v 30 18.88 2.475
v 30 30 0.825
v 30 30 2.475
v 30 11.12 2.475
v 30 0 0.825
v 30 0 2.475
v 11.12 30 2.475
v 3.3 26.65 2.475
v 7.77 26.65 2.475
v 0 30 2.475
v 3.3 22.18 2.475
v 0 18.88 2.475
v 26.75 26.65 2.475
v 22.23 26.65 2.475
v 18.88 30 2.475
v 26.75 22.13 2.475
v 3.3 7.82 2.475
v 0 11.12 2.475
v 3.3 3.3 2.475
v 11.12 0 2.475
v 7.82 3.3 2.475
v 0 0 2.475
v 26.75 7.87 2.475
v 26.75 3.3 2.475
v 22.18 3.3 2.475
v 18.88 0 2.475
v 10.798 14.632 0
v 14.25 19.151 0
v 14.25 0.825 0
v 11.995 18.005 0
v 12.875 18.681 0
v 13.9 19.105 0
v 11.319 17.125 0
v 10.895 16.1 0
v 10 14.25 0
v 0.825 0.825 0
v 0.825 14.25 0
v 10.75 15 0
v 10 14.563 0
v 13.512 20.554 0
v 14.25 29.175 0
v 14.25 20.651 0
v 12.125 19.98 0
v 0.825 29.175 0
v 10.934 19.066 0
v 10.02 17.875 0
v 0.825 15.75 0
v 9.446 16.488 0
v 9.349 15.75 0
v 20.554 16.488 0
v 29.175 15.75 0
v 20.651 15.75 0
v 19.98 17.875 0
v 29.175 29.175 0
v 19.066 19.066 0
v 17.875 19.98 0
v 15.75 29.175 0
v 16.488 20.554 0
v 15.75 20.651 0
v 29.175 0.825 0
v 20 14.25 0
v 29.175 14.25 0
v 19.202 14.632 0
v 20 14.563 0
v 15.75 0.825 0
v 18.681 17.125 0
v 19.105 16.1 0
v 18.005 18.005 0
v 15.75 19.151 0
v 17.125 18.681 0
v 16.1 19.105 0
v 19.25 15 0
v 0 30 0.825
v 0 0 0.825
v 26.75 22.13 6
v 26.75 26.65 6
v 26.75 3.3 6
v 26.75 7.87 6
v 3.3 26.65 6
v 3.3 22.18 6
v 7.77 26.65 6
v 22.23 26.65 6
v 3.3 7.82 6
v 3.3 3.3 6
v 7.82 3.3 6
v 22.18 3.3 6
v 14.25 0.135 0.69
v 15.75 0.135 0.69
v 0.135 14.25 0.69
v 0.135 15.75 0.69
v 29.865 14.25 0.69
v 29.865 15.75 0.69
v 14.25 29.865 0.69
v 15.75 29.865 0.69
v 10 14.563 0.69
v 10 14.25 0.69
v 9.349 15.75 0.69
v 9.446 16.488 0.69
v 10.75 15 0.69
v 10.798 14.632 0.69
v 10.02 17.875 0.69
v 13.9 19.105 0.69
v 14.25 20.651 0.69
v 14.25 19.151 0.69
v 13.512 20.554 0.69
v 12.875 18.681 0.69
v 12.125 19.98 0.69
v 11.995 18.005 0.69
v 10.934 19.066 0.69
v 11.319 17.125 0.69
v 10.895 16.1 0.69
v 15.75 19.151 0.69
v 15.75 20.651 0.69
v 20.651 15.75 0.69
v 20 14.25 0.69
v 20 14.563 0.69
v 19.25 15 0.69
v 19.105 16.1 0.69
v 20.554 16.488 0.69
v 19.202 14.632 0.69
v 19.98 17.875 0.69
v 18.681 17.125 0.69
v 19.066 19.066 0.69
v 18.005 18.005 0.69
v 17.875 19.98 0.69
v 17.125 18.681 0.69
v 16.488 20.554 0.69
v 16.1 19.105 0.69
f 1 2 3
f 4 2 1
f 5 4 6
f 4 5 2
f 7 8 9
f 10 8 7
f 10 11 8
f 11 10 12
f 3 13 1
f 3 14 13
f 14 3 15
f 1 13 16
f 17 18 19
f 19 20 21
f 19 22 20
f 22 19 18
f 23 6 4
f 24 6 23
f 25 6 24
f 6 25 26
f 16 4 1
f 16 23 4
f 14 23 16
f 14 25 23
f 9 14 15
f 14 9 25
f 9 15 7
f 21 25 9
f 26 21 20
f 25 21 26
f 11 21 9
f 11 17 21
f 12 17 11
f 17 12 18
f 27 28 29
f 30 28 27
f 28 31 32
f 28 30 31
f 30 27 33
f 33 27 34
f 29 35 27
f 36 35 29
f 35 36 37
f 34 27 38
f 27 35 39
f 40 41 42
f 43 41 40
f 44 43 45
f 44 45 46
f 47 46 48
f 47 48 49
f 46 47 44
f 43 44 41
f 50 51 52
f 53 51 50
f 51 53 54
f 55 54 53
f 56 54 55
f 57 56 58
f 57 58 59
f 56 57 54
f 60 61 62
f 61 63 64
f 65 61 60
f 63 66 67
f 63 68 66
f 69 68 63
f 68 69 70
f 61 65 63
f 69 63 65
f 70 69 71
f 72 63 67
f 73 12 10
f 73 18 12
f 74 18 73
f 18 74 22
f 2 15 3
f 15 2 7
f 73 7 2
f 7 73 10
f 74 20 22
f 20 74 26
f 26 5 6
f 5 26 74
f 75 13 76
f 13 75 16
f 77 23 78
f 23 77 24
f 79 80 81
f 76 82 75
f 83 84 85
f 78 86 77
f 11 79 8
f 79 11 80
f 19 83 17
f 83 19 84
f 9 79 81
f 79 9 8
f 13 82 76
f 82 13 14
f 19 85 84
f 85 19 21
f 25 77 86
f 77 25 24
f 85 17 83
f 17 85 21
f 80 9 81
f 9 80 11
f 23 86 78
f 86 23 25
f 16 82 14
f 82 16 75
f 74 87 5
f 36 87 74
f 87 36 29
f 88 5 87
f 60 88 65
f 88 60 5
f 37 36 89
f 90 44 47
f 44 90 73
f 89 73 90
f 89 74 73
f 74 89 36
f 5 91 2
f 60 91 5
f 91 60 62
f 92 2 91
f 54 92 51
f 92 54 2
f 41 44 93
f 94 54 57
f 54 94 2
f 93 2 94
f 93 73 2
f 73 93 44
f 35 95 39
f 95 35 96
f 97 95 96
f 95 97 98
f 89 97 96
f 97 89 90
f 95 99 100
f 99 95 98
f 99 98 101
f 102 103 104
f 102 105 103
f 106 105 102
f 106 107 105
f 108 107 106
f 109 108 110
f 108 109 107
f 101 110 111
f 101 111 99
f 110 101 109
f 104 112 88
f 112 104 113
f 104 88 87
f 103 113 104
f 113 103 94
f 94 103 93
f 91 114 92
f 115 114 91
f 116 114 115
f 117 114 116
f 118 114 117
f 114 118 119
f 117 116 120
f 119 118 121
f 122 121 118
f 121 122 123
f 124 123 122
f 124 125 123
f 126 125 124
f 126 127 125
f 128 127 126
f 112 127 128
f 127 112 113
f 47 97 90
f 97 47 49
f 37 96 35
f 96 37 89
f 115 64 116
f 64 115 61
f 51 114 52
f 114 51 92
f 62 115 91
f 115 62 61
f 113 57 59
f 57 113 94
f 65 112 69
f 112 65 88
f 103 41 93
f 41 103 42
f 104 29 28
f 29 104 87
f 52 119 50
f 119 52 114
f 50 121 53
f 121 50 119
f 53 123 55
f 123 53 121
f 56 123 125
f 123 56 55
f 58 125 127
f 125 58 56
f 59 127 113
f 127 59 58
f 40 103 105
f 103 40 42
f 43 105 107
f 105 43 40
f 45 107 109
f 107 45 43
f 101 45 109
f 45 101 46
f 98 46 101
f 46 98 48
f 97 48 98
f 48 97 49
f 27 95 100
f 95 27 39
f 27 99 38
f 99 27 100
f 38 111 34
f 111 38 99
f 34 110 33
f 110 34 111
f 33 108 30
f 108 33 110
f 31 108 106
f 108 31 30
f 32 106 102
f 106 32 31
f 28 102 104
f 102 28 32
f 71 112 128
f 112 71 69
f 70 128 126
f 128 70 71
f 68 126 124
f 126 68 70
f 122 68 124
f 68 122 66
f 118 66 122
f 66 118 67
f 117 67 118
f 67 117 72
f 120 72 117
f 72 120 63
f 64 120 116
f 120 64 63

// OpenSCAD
// file: settings.scad
cube_width=30;
cube_height=16;
cube_thickness=3.3;

cap_width=30;
cap_height=6;
cap_thickness=3.3;

glyph_depth=0.7;
glyph_thickness=1.5;

photo_resitor_hole_r = 2.4;
spring_contact_hole_r = 3.125;
// file: sym_inductor.scad
module sector(radius, angles, fn = 24) {
    r = radius / cos(180 / fn);
    step = -360 / fn;

    points = concat([[0, 0]],
        [for(a = [angles[0] : step : angles[1] - 360]) 
            [r * cos(a), r * sin(a)]
        ],
        [[r * cos(angles[1]), r * sin(angles[1])]]
    );

    difference() {
        circle(radius, $fn = fn);
        polygon(points);
    }
}

module arc(radius, angles, width, fn = 24) {
    difference() {
        sector(radius + width/2, angles, fn);
        sector(radius - width/2, angles, fn);
    }
} 

module arc_3d(radius, angles, width, depth, fn)
{
    linear_extrude(depth) arc(radius, angles, width);
}

module sym_inductor(height, depth, thickness)
{
    n1 = 3.33;
    //translate([0,-thickness/2,0]) cube([height/6, 2*thickness, depth]);
    r1 = height/(2*n1);
    
    translate([height/6,r1+thickness/2,0]) arc_3d(r1+thickness/2, [-90, 90], thickness, depth, 120);
    
    translate([height/6,3*r1+1.5*thickness,0]) arc_3d(r1+thickness/2, [-90, 90], thickness, depth, 120);

    translate([height/6,5*r1+2.5*thickness,0]) arc_3d(r1+thickness/2, [-90, 90], thickness, depth, 120);

    //translate([0,height-1.5*thickness,0]) cube([height/6, 2*thickness, depth]);
}

sym_inductor(30, 0.5, 1);
// file: cap_1x1.scad
include <settings.scad>

module cap_1x1(width, height, thickness, holes_mask)
{
    width1=width-thickness;
    difference()
    {
        union()
        {
            cube([width, width, thickness*3/4]);
            translate([thickness,thickness,0])cube([width-2*(thickness-0.025), width-2*(thickness+0.025), height]);
        }
        union()
        {
            translate([width/2,width/2,0])rotate([0,0,45])translate([-width1/2,-width1/2,thickness*3/4]) cube([width1,width1,height]);
                        //corners
            translate([0,0.25*thickness,0])rotate([45,0,0]) translate([-0.5*width, -width, -0.5*height]) cube([2*width, width, 2*height]);
            translate([0.25*thickness,0,0]) rotate([0,-45,0]) translate([-width, -0.5*width, -0.5*height]) cube([width, 2*width, 2*height]);
            translate([width-0.25*thickness,0,0]) rotate([0,45,0]) translate([0, 0, -0.5*height]) cube([width, 2*width, 2*height]);
            translate([0,width-0.25*thickness,0]) rotate([-45,0,0]) translate([-0.5*width, 0, -0.5*height]) cube([2*width, width, 2*height]);
            
            if (holes_mask >= 8)
            {
                translate([width/2, thickness-1.5, -0.5]) cylinder(r=1.15, h=height*1.5, $fn=80);
            }
            if ((holes_mask%8) >= 4)
            {
                translate([width/2, width-thickness+1.5, -0.5]) cylinder(r=1.15, h=height*1.5, $fn=80);
            }
            if ((holes_mask%4)>= 2)
            {
                translate([thickness-1.5, width/2, -0.5]) cylinder(r=1.15, h=height*1.5, $fn=80);
            }
            if (holes_mask%2 >= 1)
            {
                translate([width-thickness+1.5, width/2, -0.5]) cylinder(r=1.15, h=height*1.5, $fn=80);
            }
        }
    }
}

cap_1x1(cap_width, cap_height, cap_thickness, 9);
//ring(10,1,1);
//arrow(1, 20, 3, 1);
//transistor_npn(30, 1, 1);
// main file
use <cap_1x1.scad>
use <sym_inductor.scad>
include <settings.scad>

module cap_1x1_wireP(width, height, thickness)
{
    difference()
    {
        cap_1x1(width, height, thickness, 0);
        translate([0,(width-glyph_thickness)/2,-0.01]) cube([width/3, glyph_thickness, glyph_depth]);
        translate([2*width/3,(width-glyph_thickness)/2,-0.01]) cube([width/3, glyph_thickness, glyph_depth]);
        translate([(width-glyph_thickness)/2, 0, -0.01]) cube([glyph_thickness, width, glyph_depth]);
        
        translate([width/2,width/2, -0.01])arc_3d(width/6, [185,-5], glyph_thickness, glyph_depth, 60);
        //translate([width/2, width/2, -0.01]) cylinder(h=glyph_depth, r=1.5*glyph_thickness, $fn=120);
    }
}

cap_1x1_wireP(cap_width, cap_height, cap_thickness);
